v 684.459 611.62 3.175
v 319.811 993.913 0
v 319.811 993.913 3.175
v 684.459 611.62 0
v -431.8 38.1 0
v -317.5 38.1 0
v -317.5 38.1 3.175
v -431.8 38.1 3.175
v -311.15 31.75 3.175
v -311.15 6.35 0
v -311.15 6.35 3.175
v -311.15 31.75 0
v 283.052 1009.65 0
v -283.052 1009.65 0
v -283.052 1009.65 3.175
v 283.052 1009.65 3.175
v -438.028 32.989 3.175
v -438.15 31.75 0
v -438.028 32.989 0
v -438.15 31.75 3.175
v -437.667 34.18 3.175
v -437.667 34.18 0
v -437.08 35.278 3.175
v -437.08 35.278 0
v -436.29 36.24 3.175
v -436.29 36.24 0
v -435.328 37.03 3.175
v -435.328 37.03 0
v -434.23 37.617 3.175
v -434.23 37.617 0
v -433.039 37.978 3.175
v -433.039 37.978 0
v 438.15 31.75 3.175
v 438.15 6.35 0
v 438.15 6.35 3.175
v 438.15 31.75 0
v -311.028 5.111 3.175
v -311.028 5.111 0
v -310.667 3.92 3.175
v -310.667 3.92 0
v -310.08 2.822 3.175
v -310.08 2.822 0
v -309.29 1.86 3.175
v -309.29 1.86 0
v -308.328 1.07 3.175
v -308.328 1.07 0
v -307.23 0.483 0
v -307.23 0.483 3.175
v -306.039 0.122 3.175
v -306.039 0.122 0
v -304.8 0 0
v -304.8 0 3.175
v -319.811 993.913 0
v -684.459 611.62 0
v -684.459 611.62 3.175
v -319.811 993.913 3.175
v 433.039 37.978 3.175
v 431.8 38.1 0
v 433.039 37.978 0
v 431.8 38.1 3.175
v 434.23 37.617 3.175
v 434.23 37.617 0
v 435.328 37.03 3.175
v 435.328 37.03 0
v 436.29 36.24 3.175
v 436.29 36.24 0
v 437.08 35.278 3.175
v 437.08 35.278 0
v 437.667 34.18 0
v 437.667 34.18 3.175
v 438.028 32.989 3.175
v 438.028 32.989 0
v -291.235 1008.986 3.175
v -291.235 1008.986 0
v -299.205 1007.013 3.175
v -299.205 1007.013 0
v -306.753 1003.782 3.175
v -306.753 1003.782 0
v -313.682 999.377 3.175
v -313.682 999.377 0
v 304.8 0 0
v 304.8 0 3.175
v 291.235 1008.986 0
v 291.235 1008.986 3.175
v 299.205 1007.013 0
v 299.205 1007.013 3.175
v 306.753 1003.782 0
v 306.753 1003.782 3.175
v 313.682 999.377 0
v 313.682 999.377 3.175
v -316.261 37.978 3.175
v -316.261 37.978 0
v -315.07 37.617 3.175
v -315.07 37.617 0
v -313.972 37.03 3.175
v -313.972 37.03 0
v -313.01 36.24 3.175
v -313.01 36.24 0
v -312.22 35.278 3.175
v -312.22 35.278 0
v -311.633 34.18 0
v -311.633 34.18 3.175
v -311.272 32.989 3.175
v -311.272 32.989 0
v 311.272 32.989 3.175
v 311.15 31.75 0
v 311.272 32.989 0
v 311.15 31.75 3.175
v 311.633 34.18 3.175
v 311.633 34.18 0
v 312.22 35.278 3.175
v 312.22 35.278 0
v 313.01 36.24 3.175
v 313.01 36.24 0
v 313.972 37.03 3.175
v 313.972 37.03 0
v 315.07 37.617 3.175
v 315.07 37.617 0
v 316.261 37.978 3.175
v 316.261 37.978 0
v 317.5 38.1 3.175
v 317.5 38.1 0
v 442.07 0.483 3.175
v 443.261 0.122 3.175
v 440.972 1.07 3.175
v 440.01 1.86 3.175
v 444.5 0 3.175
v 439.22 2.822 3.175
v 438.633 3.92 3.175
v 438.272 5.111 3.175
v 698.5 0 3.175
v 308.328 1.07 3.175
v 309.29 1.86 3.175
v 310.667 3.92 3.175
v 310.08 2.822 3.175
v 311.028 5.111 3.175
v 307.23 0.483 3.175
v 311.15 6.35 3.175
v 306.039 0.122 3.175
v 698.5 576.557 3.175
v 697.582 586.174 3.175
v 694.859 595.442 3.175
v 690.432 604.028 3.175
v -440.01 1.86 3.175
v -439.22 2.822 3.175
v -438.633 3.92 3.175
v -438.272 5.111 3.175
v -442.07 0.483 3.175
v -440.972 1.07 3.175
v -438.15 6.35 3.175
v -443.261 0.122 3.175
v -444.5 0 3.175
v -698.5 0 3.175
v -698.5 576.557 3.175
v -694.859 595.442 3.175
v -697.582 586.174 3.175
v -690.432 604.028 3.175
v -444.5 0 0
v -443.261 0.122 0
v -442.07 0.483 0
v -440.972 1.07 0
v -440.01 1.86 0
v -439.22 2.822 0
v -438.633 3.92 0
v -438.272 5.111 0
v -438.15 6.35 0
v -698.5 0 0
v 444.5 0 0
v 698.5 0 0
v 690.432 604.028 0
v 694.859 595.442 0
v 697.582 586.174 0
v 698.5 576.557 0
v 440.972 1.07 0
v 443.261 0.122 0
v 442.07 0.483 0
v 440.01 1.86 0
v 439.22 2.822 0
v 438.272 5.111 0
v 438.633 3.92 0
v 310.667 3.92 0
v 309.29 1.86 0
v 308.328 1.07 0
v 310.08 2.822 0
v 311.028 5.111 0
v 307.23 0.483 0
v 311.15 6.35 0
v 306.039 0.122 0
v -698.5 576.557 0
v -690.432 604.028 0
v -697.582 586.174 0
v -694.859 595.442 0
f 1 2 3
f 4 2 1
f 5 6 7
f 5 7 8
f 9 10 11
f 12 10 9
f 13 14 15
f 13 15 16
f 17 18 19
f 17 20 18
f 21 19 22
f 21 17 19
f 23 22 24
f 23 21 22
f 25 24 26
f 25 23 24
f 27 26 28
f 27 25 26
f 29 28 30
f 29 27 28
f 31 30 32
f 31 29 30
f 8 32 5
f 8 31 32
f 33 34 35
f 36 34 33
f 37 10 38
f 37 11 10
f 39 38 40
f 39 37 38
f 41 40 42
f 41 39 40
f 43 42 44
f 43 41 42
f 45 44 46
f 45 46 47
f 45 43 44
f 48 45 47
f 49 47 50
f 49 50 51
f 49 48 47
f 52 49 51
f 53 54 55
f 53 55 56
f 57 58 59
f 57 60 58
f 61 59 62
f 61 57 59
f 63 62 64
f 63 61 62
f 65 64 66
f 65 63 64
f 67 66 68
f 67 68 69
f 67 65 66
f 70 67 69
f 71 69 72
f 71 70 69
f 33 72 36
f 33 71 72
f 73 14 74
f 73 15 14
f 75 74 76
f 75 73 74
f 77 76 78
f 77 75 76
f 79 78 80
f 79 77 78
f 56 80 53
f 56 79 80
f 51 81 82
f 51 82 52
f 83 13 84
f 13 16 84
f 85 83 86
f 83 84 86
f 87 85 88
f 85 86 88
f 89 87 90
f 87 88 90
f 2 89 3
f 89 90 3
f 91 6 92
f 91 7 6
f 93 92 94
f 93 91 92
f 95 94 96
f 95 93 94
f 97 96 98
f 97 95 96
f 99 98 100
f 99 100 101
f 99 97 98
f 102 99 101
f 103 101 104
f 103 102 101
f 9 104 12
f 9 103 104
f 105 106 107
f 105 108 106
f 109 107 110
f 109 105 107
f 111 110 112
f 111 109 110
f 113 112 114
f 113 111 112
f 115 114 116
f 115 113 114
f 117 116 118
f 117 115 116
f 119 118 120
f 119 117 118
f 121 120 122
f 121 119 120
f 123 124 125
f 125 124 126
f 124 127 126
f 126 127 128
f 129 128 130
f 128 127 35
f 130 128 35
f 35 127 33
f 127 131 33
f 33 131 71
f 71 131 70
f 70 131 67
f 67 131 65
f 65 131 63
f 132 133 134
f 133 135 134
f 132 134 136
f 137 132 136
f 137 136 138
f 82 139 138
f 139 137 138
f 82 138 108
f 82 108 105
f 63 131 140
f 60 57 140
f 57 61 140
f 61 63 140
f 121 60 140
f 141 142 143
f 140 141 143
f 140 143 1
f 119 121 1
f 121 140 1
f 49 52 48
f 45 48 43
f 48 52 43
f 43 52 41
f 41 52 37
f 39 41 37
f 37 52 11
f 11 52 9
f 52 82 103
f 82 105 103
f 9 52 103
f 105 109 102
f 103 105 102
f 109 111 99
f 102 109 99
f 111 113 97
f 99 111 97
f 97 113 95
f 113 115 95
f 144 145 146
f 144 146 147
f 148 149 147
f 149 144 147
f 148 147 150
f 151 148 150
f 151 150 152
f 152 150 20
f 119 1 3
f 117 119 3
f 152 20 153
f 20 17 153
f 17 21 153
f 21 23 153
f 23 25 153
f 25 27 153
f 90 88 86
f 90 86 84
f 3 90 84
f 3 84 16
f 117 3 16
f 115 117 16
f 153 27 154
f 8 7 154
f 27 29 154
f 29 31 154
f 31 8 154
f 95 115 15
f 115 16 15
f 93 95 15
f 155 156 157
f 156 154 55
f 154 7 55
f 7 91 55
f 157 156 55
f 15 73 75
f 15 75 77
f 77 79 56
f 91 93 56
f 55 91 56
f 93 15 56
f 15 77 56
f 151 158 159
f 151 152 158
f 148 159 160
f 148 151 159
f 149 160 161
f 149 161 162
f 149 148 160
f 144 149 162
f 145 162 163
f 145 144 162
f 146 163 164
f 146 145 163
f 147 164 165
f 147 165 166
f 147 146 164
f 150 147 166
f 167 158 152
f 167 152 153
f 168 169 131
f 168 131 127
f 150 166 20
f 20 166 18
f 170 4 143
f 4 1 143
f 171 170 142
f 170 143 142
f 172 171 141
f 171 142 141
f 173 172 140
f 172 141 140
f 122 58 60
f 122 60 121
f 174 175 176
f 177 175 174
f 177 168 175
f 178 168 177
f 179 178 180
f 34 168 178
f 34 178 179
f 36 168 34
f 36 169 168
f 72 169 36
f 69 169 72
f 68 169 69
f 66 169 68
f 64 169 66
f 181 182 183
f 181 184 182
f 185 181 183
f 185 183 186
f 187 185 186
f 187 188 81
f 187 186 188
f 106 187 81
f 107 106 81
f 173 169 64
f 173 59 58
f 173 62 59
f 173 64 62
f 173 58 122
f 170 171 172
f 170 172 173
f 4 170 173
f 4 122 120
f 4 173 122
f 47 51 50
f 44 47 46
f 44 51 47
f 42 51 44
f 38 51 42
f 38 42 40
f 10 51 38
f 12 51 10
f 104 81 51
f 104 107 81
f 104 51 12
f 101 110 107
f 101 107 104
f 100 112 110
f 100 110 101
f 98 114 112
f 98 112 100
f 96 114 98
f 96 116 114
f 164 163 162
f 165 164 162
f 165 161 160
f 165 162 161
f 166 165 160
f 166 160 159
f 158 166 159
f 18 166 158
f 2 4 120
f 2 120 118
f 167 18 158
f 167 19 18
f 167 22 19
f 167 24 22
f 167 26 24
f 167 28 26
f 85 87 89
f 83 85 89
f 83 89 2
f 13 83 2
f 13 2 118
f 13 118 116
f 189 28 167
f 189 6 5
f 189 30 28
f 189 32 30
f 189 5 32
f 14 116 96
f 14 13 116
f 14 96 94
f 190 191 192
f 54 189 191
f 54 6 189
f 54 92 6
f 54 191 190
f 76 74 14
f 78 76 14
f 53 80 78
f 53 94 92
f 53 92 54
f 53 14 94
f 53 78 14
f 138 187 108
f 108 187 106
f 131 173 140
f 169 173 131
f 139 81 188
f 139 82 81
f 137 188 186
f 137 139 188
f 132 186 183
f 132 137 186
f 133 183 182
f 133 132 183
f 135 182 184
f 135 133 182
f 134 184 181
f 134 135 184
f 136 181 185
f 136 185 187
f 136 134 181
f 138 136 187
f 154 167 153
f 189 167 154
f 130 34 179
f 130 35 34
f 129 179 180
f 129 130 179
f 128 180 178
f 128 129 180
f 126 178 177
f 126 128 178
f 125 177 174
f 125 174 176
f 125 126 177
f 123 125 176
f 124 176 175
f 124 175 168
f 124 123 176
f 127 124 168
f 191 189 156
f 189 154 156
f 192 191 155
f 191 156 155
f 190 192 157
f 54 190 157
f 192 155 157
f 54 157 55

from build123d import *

# Parameters (mm, degrees)
BOSS_EXTRUDE1_DEPTH = 3.175
FILLET2_R           = 50.8
SKETCH2_W           = 127
SKETCH2_H           = 38.1
CUT_EXTRUDE1_DEPTH  = 4.175
FILLET3_R           = 6.35


with BuildPart() as part:
    # Sketch1 → Boss-Extrude1 (new body)
    with BuildSketch(Plane.XY):
        Polygon((-304.8, 1009.65), (304.8, 1009.65), (698.5, 596.9), (698.5, 0), (-698.5, 0), (-698.5, 596.9), align=None)
    extrude(amount=BOSS_EXTRUDE1_DEPTH)

    # Fillet2
    fillet2_edges = [part.edges().sort_by_distance(p)[0] for p in [
        (698.5, 596.9, 1.5875),
        (-698.5, 596.9, 1.5875),
        (-304.8, 1009.65, 1.5875),
        (304.8, 1009.65, 1.5875),
    ]]
    fillet(fillet2_edges, radius=FILLET2_R)

    # Sketch2 → Cut-Extrude1 (cut, through all)
    with BuildSketch(Plane(origin=(0, 0, 0), x_dir=(-1, 0, 0), z_dir=(0, 0, -1))):
        with Locations((374.65, 19.05)):
            Rectangle(SKETCH2_W, SKETCH2_H)
        with Locations((-374.65, 19.05)):
            Rectangle(SKETCH2_W, SKETCH2_H)
    extrude(amount=-CUT_EXTRUDE1_DEPTH, mode=Mode.SUBTRACT)

    # Fillet3
    fillet3_edges = [part.edges().sort_by_distance(p)[0] for p in [
        (-311.15, 0, 1.5875),
        (-311.15, 38.1, 1.5875),
        (-438.15, 38.1, 1.5875),
        (-438.15, 0, 1.5875),
        (311.15, 0, 1.5875),
        (438.15, 0, 1.5875),
        (438.15, 38.1, 1.5875),
        (311.15, 38.1, 1.5875),
    ]]
    fillet(fillet3_edges, radius=FILLET3_R)


solid = part.part
